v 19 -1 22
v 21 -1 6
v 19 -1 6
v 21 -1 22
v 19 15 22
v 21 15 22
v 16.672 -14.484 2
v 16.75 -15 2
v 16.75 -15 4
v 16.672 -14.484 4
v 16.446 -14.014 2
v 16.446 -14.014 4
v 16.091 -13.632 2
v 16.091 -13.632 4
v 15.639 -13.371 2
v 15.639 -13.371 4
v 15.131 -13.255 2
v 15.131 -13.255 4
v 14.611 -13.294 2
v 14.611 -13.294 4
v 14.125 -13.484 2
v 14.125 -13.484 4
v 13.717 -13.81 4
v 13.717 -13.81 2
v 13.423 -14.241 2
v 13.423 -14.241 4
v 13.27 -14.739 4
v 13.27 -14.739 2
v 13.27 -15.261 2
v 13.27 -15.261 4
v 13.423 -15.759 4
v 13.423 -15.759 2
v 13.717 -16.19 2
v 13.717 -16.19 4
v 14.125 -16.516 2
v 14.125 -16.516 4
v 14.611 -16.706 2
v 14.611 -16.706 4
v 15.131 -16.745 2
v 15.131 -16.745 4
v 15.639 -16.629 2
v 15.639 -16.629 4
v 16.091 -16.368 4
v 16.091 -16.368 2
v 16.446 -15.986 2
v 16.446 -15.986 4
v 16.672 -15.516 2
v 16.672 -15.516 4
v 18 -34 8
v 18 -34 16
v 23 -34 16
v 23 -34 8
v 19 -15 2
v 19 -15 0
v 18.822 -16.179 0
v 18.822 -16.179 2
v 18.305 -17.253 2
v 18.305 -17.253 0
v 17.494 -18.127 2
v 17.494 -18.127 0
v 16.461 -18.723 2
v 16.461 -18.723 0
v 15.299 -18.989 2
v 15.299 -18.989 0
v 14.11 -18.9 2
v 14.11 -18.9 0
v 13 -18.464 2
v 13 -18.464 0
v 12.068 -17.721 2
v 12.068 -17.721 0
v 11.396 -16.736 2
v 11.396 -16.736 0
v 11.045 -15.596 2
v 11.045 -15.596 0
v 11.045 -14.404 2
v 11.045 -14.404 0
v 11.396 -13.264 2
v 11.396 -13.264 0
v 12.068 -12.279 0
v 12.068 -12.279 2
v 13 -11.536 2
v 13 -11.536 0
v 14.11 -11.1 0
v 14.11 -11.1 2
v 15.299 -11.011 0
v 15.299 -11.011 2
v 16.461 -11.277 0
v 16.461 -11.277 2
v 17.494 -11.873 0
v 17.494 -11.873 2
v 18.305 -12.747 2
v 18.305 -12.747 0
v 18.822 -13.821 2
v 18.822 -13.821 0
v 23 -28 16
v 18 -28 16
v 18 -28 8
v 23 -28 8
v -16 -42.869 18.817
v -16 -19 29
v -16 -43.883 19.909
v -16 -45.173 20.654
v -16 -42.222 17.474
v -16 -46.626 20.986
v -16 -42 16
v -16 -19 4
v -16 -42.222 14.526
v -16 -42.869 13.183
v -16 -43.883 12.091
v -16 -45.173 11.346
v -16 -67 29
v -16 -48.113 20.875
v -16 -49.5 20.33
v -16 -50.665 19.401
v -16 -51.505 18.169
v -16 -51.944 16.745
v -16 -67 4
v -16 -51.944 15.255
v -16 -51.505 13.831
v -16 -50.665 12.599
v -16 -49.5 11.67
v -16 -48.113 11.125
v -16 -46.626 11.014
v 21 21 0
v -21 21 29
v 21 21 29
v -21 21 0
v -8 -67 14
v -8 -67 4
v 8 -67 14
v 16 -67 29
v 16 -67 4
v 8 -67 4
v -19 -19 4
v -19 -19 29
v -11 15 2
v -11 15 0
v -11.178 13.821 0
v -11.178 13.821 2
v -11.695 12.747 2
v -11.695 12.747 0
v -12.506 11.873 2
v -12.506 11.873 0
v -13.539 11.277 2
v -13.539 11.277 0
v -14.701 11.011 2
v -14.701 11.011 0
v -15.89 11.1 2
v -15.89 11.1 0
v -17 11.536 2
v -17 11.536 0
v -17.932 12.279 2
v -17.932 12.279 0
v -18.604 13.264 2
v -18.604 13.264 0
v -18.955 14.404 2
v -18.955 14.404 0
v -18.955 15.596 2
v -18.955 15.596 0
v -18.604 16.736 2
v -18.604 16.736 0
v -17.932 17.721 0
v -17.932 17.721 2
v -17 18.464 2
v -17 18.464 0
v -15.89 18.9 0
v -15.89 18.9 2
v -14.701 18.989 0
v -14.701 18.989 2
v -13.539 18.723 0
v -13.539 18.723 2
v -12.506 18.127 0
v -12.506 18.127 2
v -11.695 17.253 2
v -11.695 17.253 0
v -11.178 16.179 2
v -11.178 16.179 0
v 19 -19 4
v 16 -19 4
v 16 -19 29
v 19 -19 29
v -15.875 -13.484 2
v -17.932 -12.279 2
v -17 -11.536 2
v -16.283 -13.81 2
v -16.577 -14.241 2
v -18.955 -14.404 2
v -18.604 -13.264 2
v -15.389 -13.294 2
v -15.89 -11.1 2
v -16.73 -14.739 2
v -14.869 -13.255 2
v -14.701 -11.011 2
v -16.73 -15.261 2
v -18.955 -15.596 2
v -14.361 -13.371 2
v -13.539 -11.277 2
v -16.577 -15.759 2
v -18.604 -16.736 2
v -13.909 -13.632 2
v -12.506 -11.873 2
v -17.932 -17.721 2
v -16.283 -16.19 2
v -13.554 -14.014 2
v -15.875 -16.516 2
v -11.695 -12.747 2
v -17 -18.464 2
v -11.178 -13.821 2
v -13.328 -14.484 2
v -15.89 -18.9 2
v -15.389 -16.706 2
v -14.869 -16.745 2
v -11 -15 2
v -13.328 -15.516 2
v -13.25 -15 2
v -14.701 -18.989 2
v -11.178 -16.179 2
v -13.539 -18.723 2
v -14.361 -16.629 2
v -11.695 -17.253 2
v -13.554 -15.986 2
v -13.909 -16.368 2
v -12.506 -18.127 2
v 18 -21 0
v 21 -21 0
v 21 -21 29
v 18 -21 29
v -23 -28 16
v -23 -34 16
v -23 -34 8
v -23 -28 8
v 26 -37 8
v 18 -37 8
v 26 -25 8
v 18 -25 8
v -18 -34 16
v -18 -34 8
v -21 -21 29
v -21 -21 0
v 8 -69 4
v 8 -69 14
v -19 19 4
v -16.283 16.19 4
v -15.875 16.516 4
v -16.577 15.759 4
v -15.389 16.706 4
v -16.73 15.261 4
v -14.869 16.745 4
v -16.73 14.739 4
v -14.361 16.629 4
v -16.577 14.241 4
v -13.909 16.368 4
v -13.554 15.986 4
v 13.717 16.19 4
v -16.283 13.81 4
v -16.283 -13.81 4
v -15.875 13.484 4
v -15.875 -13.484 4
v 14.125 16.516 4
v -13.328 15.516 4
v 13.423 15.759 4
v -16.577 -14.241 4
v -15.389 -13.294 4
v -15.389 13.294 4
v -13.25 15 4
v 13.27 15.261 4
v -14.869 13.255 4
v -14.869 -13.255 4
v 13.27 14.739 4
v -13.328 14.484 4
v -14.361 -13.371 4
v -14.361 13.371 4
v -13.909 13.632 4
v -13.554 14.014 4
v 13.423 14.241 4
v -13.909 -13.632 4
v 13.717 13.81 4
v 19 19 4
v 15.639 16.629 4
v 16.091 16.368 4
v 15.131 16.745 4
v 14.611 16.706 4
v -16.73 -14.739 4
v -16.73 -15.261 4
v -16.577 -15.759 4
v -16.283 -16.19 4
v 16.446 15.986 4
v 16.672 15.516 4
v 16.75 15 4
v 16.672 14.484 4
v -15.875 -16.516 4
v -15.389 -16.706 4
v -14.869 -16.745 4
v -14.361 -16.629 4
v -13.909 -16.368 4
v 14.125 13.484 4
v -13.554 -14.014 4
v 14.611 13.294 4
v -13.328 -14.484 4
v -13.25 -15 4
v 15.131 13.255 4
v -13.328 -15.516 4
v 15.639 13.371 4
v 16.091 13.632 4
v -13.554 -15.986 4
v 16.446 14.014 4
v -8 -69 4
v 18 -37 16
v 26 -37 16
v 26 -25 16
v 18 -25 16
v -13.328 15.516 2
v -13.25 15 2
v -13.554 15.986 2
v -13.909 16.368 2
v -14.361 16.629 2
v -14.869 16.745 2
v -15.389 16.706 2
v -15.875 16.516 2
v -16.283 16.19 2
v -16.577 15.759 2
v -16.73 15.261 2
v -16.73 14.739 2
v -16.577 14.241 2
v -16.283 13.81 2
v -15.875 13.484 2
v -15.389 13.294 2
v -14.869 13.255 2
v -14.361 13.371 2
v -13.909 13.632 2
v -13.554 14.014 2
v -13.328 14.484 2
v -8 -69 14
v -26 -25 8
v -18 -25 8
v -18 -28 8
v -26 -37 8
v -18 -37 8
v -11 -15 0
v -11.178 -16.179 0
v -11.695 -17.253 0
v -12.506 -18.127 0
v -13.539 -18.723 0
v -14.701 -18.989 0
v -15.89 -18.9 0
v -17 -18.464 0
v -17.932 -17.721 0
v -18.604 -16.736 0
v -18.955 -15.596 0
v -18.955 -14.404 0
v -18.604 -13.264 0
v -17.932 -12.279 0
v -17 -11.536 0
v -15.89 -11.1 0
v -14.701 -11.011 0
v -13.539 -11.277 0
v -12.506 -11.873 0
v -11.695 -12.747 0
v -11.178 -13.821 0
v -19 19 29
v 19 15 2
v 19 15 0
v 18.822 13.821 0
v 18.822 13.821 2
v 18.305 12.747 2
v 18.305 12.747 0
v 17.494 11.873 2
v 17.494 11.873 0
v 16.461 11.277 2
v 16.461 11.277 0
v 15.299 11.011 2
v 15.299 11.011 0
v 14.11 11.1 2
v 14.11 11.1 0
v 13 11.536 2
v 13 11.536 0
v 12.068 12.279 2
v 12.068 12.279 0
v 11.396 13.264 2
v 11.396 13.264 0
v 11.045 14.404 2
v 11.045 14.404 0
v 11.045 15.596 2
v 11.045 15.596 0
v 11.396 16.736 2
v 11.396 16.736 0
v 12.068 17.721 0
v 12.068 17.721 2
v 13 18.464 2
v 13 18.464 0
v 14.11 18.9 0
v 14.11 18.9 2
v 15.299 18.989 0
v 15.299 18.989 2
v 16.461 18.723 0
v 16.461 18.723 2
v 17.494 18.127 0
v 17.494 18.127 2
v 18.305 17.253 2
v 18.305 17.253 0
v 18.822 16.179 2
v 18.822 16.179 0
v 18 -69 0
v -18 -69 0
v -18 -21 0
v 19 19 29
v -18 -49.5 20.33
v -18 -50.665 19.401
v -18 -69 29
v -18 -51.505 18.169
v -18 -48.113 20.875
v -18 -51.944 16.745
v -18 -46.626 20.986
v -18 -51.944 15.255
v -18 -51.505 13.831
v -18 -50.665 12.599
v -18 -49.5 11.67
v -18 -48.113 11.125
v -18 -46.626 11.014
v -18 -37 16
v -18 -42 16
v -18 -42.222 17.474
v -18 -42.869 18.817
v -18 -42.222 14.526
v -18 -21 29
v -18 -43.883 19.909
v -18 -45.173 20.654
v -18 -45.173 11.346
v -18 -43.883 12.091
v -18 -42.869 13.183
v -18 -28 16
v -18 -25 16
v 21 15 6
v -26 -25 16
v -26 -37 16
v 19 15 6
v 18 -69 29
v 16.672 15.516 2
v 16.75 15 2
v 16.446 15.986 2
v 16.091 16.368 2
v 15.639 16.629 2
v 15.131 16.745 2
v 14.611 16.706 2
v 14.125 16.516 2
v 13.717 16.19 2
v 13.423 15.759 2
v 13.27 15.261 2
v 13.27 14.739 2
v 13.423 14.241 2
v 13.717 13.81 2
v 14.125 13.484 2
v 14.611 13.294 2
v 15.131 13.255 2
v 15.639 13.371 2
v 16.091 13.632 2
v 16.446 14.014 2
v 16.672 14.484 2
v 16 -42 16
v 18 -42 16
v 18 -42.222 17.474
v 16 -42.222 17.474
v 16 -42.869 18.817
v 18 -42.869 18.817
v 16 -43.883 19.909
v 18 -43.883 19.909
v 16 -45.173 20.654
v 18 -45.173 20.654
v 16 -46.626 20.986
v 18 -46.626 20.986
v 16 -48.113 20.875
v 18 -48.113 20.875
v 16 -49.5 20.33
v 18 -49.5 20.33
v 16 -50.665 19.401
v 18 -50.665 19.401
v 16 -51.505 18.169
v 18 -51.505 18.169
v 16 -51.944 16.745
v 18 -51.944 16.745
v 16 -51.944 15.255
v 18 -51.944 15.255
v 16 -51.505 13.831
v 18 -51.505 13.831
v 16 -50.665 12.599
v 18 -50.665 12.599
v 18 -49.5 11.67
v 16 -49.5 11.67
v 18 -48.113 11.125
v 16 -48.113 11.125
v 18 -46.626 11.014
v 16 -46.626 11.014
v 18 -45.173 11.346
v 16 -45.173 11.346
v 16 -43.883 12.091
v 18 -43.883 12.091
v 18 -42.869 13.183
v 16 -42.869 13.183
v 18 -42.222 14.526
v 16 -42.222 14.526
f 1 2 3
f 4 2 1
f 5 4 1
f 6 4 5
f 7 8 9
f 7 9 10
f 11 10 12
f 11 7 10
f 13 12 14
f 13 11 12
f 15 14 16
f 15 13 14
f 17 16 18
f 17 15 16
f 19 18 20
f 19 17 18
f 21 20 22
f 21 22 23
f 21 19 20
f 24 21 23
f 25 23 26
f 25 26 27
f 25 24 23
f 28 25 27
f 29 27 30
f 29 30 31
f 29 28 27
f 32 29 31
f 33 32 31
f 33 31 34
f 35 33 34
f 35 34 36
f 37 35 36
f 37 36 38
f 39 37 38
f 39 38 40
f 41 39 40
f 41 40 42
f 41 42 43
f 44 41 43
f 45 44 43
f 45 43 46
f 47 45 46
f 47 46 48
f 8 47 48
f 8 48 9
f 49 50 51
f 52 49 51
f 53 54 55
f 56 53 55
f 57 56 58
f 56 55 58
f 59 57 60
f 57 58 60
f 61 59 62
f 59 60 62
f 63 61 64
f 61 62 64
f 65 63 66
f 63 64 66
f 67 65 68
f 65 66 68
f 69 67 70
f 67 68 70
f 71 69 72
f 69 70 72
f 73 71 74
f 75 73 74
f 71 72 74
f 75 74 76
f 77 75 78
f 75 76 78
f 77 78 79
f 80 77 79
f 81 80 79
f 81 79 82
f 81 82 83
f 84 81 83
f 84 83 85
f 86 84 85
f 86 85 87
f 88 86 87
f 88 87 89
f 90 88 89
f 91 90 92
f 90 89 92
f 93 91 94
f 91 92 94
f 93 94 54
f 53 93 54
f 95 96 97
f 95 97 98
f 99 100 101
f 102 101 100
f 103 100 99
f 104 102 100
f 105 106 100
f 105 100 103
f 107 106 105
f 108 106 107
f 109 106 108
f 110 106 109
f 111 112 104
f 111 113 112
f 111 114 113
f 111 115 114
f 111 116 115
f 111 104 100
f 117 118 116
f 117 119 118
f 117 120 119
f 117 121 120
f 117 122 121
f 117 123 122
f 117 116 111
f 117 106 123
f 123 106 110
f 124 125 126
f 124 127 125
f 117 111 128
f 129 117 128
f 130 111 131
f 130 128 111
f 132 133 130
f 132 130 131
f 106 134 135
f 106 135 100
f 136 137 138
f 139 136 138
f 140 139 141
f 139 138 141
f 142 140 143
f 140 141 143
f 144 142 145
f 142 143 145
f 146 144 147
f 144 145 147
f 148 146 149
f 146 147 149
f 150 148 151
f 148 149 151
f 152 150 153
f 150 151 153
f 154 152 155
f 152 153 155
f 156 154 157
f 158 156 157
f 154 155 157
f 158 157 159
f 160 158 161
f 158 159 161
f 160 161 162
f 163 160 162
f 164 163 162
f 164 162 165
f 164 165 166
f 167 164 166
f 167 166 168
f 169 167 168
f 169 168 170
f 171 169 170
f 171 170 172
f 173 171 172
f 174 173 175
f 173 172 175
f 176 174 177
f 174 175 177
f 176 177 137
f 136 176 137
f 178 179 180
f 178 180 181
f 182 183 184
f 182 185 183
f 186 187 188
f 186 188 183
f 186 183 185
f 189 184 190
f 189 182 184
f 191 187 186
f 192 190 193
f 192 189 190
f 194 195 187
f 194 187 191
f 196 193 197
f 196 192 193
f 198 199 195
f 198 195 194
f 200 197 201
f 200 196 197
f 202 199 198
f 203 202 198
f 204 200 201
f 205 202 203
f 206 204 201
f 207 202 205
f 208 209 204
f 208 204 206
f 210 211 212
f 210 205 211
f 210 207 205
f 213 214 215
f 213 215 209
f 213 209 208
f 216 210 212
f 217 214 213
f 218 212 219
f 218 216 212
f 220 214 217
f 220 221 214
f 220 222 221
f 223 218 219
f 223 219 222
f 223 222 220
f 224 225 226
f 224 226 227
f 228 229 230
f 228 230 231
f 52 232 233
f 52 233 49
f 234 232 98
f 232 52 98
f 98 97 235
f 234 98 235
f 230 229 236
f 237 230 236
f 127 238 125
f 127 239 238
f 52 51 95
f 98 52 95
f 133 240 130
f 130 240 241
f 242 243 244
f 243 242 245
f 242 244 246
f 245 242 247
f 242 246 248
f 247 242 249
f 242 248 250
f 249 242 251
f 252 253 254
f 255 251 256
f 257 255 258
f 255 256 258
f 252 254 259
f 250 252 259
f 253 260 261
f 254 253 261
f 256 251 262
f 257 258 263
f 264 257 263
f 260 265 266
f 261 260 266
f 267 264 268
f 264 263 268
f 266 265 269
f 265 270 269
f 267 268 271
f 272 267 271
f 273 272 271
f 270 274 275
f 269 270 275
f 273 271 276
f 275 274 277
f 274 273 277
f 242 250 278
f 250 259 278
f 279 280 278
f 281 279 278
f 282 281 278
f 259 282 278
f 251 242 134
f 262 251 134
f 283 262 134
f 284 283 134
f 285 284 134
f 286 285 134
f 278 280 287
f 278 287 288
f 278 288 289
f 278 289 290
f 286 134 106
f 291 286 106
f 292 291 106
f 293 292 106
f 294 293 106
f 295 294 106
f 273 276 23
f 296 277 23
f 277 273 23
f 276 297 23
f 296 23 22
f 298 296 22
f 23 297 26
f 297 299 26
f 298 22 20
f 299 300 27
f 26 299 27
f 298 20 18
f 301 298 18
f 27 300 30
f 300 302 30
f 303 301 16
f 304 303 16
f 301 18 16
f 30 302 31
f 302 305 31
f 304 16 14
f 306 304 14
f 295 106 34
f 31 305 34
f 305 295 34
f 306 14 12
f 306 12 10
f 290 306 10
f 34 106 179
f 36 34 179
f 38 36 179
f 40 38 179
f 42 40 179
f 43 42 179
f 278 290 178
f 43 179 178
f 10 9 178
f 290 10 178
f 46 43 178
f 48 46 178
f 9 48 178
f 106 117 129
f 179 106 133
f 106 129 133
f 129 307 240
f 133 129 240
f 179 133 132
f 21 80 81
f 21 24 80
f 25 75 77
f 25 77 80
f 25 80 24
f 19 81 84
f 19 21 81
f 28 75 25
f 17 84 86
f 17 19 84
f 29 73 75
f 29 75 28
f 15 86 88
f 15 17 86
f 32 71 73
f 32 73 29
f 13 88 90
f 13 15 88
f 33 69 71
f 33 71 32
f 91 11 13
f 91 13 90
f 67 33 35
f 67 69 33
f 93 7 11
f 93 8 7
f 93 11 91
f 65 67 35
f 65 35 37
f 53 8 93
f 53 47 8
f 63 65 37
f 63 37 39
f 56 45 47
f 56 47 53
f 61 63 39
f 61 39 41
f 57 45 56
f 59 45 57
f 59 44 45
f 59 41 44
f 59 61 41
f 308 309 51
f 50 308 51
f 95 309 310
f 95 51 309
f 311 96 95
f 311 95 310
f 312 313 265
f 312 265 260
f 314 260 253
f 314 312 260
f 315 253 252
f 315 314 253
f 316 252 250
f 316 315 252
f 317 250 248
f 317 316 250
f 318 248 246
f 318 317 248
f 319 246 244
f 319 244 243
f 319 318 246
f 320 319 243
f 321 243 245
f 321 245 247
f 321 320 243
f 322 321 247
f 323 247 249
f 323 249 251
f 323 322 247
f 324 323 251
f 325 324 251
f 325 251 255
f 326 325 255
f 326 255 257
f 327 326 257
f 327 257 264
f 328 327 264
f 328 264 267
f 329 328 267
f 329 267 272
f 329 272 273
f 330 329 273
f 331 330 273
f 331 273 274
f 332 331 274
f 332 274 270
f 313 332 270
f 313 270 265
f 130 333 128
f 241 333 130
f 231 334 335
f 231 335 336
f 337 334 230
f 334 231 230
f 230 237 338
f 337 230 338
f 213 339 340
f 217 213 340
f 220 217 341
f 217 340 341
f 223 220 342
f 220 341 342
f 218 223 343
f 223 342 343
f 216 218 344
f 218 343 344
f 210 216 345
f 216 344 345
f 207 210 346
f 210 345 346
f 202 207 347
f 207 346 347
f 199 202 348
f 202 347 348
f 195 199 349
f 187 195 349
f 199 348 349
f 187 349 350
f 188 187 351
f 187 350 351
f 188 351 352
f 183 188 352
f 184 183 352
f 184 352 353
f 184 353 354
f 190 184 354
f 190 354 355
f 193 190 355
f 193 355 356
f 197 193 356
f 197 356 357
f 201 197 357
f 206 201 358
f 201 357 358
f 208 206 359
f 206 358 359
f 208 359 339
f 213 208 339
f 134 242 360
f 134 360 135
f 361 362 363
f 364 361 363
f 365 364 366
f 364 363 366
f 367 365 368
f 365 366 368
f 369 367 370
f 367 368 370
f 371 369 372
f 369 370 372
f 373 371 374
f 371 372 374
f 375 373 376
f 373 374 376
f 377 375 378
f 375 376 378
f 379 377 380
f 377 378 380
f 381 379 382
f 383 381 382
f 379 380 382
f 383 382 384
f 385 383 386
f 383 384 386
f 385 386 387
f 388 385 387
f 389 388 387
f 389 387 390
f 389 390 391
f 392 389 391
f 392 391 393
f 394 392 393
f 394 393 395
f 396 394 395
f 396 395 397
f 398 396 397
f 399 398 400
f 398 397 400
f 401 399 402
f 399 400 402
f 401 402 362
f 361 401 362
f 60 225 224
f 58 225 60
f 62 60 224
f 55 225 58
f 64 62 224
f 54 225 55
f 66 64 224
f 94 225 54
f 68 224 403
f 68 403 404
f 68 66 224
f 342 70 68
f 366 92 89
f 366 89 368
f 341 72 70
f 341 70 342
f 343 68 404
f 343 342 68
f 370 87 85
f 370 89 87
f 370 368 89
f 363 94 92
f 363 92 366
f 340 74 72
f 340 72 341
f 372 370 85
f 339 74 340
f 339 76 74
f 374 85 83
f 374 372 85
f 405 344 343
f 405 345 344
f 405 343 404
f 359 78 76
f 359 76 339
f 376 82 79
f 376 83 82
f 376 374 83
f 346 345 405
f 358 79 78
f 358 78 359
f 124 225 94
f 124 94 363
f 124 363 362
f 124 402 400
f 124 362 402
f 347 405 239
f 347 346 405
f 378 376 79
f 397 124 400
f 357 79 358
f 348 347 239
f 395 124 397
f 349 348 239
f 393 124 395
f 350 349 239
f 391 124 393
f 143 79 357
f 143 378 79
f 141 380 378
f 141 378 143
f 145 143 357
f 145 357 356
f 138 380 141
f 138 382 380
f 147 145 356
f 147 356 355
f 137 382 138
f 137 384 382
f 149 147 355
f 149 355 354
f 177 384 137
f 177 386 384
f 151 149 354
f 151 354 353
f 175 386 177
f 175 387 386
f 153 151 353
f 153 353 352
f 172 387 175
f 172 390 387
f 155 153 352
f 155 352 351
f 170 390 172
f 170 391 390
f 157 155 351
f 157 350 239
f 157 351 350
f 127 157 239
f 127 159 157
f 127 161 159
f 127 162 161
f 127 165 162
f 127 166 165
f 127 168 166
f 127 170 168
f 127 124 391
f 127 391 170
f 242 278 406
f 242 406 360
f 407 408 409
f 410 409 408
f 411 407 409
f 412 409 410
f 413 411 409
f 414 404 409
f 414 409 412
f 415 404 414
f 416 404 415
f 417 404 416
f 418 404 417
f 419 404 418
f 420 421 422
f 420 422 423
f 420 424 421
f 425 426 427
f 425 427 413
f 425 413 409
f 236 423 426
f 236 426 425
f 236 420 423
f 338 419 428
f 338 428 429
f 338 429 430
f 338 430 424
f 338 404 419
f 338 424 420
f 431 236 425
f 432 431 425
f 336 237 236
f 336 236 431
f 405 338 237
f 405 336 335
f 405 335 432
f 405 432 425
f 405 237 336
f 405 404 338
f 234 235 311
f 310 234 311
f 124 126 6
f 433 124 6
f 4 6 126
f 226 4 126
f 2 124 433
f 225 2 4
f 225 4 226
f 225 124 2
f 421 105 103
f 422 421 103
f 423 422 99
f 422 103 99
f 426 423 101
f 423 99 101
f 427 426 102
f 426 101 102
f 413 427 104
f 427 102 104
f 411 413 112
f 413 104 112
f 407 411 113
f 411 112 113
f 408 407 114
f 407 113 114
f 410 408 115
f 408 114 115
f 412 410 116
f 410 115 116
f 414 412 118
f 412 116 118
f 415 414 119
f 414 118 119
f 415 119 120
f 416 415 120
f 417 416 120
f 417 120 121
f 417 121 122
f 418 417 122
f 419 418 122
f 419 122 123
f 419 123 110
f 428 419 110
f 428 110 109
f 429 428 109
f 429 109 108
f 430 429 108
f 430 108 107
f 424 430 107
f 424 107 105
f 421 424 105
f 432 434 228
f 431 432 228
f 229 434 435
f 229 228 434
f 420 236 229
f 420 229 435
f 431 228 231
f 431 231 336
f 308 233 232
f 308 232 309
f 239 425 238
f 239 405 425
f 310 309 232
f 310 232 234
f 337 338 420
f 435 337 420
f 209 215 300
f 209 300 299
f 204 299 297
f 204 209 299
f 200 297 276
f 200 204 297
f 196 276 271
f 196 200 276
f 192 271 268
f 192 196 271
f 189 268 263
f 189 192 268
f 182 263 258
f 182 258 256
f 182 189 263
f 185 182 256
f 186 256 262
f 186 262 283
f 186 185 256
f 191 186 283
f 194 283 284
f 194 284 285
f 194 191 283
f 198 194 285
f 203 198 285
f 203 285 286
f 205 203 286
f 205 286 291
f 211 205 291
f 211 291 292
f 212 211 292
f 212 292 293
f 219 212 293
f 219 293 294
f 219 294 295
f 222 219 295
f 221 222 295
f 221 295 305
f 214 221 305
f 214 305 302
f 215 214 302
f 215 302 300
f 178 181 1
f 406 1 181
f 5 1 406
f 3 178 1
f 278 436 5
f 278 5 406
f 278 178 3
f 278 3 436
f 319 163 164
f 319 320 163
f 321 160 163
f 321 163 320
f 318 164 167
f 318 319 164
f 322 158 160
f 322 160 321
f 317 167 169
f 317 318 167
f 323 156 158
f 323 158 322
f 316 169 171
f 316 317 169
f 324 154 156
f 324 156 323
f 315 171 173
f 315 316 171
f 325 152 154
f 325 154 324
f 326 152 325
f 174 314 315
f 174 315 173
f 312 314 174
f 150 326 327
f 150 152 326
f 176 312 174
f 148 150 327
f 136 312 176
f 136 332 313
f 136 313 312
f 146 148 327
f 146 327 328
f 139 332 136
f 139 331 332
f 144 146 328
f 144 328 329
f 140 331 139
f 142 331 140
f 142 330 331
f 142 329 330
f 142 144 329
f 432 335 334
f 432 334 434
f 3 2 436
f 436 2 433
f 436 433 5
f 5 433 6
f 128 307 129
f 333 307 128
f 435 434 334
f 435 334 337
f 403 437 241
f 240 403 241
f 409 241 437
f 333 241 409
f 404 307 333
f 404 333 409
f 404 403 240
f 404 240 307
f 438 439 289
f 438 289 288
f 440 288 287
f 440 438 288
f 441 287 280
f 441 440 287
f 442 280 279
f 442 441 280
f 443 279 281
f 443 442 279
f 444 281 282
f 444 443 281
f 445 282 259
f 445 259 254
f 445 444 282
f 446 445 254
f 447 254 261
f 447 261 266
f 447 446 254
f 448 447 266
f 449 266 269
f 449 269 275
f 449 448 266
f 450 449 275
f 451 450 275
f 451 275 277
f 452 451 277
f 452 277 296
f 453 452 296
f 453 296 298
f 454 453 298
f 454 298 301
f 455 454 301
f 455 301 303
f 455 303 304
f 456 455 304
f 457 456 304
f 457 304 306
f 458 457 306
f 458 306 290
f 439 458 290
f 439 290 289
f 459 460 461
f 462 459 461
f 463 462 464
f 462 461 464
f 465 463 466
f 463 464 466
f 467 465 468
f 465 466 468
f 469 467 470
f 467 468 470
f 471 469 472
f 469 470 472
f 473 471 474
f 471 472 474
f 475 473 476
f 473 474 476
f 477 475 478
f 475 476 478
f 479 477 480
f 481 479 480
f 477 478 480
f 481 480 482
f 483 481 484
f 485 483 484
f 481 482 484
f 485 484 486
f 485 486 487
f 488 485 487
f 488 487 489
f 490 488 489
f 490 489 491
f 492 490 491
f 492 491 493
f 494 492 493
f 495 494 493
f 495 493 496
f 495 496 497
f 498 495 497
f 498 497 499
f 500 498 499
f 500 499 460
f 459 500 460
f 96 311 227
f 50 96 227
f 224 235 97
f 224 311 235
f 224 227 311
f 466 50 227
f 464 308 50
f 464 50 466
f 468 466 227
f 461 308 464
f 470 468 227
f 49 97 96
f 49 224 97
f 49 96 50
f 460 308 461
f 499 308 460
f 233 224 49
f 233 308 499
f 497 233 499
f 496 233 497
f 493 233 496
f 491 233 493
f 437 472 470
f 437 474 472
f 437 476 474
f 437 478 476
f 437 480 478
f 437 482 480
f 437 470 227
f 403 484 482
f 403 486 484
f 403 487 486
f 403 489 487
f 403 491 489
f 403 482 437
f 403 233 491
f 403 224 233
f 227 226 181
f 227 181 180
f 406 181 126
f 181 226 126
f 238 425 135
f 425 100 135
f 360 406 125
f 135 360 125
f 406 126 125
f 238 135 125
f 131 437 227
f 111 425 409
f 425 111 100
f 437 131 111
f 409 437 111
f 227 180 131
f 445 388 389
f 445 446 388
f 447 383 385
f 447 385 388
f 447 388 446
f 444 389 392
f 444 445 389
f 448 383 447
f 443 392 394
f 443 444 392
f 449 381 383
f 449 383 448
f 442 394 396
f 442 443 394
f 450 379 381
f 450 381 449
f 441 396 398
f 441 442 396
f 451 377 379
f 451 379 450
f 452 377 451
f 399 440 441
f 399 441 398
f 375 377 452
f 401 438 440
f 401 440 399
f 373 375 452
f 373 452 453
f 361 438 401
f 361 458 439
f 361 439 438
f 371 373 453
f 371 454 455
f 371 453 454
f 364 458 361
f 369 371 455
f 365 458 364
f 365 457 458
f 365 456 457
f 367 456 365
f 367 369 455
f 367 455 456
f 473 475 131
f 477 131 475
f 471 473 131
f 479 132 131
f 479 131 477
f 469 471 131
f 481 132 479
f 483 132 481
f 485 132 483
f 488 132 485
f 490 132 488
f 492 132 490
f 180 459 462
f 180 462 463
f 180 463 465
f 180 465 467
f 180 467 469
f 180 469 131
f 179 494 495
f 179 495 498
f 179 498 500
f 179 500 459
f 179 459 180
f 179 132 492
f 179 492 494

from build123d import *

# Parameters (mm, degrees)
SKETCH_R        = 1.75
PAD_DEPTH       = 4
PAD001_DEPTH    = 25
SKETCH002_W     = 16
SKETCH002_H     = 10
POCKET_DEPTH    = 2
SKETCH003_W     = 16
SKETCH003_H     = 16
POCKET001_DEPTH = 2
SKETCH004_W     = 12
SKETCH004_H     = 8
PAD002_DEPTH    = 8
SKETCH005_W     = 12
SKETCH005_H     = 8
PAD003_DEPTH    = 8
SKETCH006_W     = 5
SKETCH006_H     = 6
POCKET002_DEPTH = 8
SKETCH007_R     = 5
POCKET003_DEPTH = 44.001
SKETCH008_R     = 4
POCKET004_DEPTH = 2


with BuildPart() as part:
    # Sketch → Pad (new body)
    with BuildSketch(Plane.XY):
        Polygon((-21, 21), (21, 21), (21, -21), (18, -21), (18, -69), (-18, -69), (-18, -21), (-21, -21), align=None)
        with Locations((-15, 15)):
            Circle(SKETCH_R, mode=Mode.SUBTRACT)
        with Locations((15, 15)):
            Circle(SKETCH_R, mode=Mode.SUBTRACT)
        with Locations((-15, -15)):
            Circle(SKETCH_R, mode=Mode.SUBTRACT)
        with Locations((15, -15)):
            Circle(SKETCH_R, mode=Mode.SUBTRACT)
    extrude(amount=PAD_DEPTH)

    # Sketch001 (on Face14 of Pad) → Pad001 (join)
    with BuildSketch(Plane.XY.offset(4)):
        Polygon((-21, 21), (21, 21), (21, -21), (18, -21), (18, -69), (-18, -69), (-18, -21), (-21, -21), align=None)
        Polygon((-19, 19), (-19, -19), (-16, -19), (-16, -67), (16, -67), (16, -19), (19, -19), (19, 19), align=None, mode=Mode.SUBTRACT)
    extrude(amount=PAD001_DEPTH)

    # Sketch002 (on Face7 of Pad001) → Pocket (cut)
    with BuildSketch(Plane.XZ.offset(69)):
        with Locations((0, 9)):
            Rectangle(SKETCH002_W, SKETCH002_H)
    extrude(amount=-POCKET_DEPTH, mode=Mode.SUBTRACT)

    # Sketch003 (on Face26 of Pocket) → Pocket001 (cut)
    with BuildSketch(Plane.YZ.offset(21)):
        with Locations((7, 14)):
            Rectangle(SKETCH003_W, SKETCH003_H)
    extrude(amount=-POCKET001_DEPTH, mode=Mode.SUBTRACT)

    # Sketch004 (on Face19 of Pocket001) → Pad002 (join)
    with BuildSketch(Plane.YZ.offset(18)):
        with Locations((-31, 12)):
            Rectangle(SKETCH004_W, SKETCH004_H)
    extrude(amount=PAD002_DEPTH)

    # Sketch005 (on Face5 of Pad002) → Pad003 (join)
    with BuildSketch(Plane(origin=(-18, 0, 0), x_dir=(0, -1, 0), z_dir=(-1, 0, 0))):
        with Locations((31, 12)):
            Rectangle(SKETCH005_W, SKETCH005_H)
    extrude(amount=PAD003_DEPTH)

    # Sketch006 (on Face22 of Pad003) → Pocket002 (cut)
    with BuildSketch(Plane.XY.offset(16)):
        with Locations((-20.5, -31)):
            Rectangle(SKETCH006_W, SKETCH006_H)
        with Locations((20.5, -31)):
            Rectangle(SKETCH006_W, SKETCH006_H)
    extrude(amount=-POCKET002_DEPTH, mode=Mode.SUBTRACT)

    # Sketch007 (on Face24 of Pocket002) → Pocket003 (cut, through all)
    with BuildSketch(Plane.YZ.offset(18)):
        with Locations((-47, 16)):
            Circle(SKETCH007_R)
    extrude(amount=-POCKET003_DEPTH, mode=Mode.SUBTRACT)

    # Sketch008 (on Face4 of Pocket003) → Pocket004 (cut)
    with BuildSketch(Plane(origin=(0, 0, 0), x_dir=(1, 0, 0), z_dir=(0, 0, -1))):
        with Locations((-15, -15)):
            Circle(SKETCH008_R)
        with Locations((-15, 15)):
            Circle(SKETCH008_R)
        with Locations((15, 15)):
            Circle(SKETCH008_R)
        with Locations((15, -15)):
            Circle(SKETCH008_R)
    extrude(amount=-POCKET004_DEPTH, mode=Mode.SUBTRACT)


solid = part.part
